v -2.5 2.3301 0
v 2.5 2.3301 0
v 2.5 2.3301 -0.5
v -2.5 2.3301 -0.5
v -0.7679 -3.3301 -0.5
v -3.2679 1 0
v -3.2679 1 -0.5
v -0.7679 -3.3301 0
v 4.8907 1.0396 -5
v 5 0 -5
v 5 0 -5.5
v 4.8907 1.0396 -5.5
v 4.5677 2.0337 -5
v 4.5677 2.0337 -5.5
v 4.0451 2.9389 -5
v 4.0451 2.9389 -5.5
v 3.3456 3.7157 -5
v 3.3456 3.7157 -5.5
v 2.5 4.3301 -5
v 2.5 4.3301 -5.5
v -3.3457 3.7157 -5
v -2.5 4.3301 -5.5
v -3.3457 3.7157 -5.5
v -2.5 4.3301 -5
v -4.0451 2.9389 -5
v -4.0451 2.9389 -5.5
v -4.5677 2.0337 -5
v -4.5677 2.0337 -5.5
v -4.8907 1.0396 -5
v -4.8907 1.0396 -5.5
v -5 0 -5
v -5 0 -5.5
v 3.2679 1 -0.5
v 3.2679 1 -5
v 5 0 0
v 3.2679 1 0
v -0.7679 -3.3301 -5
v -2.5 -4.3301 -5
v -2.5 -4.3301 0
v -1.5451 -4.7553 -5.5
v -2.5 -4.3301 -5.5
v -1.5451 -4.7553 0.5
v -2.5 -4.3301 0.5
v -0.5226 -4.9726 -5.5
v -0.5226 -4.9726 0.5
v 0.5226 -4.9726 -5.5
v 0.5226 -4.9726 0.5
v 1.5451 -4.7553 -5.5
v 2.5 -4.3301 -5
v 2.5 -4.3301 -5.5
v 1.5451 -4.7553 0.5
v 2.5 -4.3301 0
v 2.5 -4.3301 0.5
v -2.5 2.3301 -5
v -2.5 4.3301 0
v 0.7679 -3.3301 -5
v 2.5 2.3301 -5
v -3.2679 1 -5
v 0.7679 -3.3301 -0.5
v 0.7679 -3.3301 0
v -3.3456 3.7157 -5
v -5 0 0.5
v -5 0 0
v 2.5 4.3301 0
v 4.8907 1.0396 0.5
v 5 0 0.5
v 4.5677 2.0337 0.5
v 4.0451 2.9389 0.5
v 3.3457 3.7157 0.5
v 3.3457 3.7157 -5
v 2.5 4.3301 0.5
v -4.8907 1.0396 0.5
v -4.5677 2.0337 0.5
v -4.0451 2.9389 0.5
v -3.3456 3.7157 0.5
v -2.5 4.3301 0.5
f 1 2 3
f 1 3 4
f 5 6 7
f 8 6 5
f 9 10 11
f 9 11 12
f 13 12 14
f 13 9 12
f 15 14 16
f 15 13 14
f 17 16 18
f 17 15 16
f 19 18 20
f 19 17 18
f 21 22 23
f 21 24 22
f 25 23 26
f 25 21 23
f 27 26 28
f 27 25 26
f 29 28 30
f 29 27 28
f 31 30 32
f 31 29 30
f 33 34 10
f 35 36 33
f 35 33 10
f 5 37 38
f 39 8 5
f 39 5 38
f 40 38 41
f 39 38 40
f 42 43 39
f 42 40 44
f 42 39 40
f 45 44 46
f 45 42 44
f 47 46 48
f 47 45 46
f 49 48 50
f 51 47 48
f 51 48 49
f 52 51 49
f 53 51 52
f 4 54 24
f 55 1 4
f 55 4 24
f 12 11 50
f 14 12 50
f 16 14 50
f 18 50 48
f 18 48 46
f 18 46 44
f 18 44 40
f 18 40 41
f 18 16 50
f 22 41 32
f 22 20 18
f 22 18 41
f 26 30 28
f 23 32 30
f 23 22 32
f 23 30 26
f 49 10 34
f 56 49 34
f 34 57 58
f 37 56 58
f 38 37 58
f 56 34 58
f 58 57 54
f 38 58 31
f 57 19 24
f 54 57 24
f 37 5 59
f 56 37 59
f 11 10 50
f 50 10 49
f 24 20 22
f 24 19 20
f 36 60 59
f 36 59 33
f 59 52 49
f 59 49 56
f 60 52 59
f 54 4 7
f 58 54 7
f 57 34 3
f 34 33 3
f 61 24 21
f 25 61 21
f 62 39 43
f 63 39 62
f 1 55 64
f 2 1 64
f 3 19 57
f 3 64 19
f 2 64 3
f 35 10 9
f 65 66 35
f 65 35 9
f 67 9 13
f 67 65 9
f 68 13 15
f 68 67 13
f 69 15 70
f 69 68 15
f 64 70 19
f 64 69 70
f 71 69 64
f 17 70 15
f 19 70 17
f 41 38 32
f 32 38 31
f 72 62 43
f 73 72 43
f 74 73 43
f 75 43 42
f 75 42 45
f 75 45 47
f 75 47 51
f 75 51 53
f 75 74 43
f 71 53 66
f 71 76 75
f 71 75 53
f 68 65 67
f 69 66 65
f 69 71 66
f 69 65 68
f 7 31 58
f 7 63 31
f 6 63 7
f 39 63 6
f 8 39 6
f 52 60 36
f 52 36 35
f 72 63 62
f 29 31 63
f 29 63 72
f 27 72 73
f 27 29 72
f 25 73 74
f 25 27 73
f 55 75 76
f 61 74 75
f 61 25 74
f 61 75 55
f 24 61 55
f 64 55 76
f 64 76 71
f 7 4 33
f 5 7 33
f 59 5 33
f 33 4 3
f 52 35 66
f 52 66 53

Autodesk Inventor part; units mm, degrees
ref_plane "YZ Plane" through (0, 0, 0) normal (1, 0, 0) x (0, 1, 0)
ref_plane "XZ Plane" through (0, 0, 0) normal (0, 1, 0) x (-1, 0, 0)
ref_plane "XY Plane" through (0, 0, 0) normal (0, 0, 1) x (1, 0, 0)
sketch "Sketch9" plane through (0, 0, 0) normal (0, 0, 1) x (1, 0, 0)
  line L0 (5, 0) -> (2.5, -4.3301)
  line L1 (2.5, -4.3301) -> (-2.5, -4.3301)
  line L2 (-2.5, -4.3301) -> (-5, 0)
  line L3 (-5, 0) -> (-2.5, 4.3301)
  line L4 (-2.5, 4.3301) -> (2.5, 4.3301)
  line L5 (2.5, 4.3301) -> (5, 0)
  line L6 (2.5, 4.3301) -> (2.5, 2.3301)
  line L7 (2.5, 2.3301) -> (-2.5, 2.3301)
  line L8 (-2.5, 2.3301) -> (-2.5, 4.3301)
  line L9 (-2.5, -4.3301) -> (-5, 0)
  line L10 (-0.7679, -3.3301) -> (-2.5, -4.3301)
  line L11 (-3.2679, 1) -> (-0.7679, -3.3301)
  line L12 (-5, 0) -> (-3.2679, 1)
  line L13 (5, 0) -> (2.5, -4.3301)
  line L14 (3.2679, 1) -> (5, 0)
  line L15 (0.7679, -3.3301) -> (3.2679, 1)
  line L16 (2.5, -4.3301) -> (0.7679, -3.3301)
  point P0 (0, 0)
  point P1 (0, 0)
  point P2 (-5, 0)
  dimension "d62" = 5
  dimension "d63" = 2
  dimension "d66" = 360
extrude "Extrusion9" add sketch "Sketch9" against normal blind 0.5 contours L14 L15 L16 L1 L10 L11 L12 L3 L8 L7 L6 L5
sketch "Sketch11" plane through (0, 0, -0.5) normal (0, 0, -1) x (-1, 0, 0)
  line L0 (2.5, 2.3301) -> (-2.5, 2.3301) projected
  line L1 (-2.5, 2.3301) -> (-2.5, 4.3301) projected
  line L2 (-2.5, 2.3301) -> (-2.5, 4.3301)
  line L3 (-5, 0) -> (-2.5, 4.3301) projected
  line L4 (-2.5, 4.3301) -> (-5, 0)
  line L5 (-3.2679, 1) -> (-0.7679, -3.3301) projected
  line L6 (-5, 0) -> (-3.2679, 1)
  line L7 (-3.2679, 1) -> (-2.5, 2.3301)
  line L8 (2.5, 4.3301) -> (2.5, 2.3301) projected
  line L9 (2.5, 4.3301) -> (2.5, 2.3301)
  line L10 (2.5, 2.3301) -> (3.2679, 1)
  line L11 (3.2679, 1) -> (5, 0)
  line L12 (5, 0) -> (2.5, 4.3301)
  line L13 (-0.7679, -3.3301) -> (-2.5, -4.3301)
  line L14 (2.5, -4.3301) -> (0.7679, -3.3301) projected
  line L15 (-2.5, -4.3301) -> (2.5, -4.3301)
  line L16 (2.5, -4.3301) -> (0.7679, -3.3301)
  line L17 (0.7679, -3.3301) -> (-0.7679, -3.3301)
  point P0 (0, 0)
extrude "Extrusion10" add sketch "Sketch11" along normal blind 4.5
sketch "Sketch12" plane through (0, 0, 0) normal (0, 0, 1) x (1, 0, 0)
  line L0 (3.2679, 1) -> (5, 0) projected
  line L1 (-2.5, 4.3301) -> (-5, 0)
  line L2 (-2.5, -4.3301) -> (2.5, -4.3301)
  line L3 (2.5, 4.3301) -> (2.5, 2.3301) projected
  line L4 (5, 0) -> (2.5, 4.3301)
  arc A0 (-2.5, 4.3301) -> (-5, 0) centre (0, 0) ccw
  arc A1 (-2.5, -4.3301) -> (2.5, -4.3301) centre (0, 0) ccw
  arc A2 (5, 0) -> (2.5, 4.3301) centre (0, 0) ccw
extrude "Extrusion11" add sketch "Sketch12" against normal up to surface (5 mm away)
extrude "Extrusion12" add sketch "Sketch9" along normal blind 0.5
extrude "Extrusion13" add sketch "Sketch12" along normal blind 0.5
sketch "Sketch13" plane through (0, 0, -5) normal (0, 0, -1) x (-1, 0, 0)
  line L0 (2.5, 4.3301) -> (2.5, 2.3301) projected
  line L1 (-2.5, 4.3301) -> (2.5, 4.3301) projected
  line L2 (2.5, 4.3301) -> (-2.5, 4.3301)
  line L3 (-5, 0) -> (-2.5, -4.3301)
  line L4 (2.5, -4.3301) -> (5, 0)
  arc A0 (5, 0) -> (2.5, 4.3301) centre (0, 0) ccw
  arc A1 (-2.5, 4.3301) -> (-5, 0) centre (0, 0) ccw
  arc A2 (-2.5, -4.3301) -> (2.5, -4.3301) centre (0, 0) ccw
extrude "Extrusion14" add sketch "Sketch13" along normal blind 0.5
properties part number "BodyNew"
